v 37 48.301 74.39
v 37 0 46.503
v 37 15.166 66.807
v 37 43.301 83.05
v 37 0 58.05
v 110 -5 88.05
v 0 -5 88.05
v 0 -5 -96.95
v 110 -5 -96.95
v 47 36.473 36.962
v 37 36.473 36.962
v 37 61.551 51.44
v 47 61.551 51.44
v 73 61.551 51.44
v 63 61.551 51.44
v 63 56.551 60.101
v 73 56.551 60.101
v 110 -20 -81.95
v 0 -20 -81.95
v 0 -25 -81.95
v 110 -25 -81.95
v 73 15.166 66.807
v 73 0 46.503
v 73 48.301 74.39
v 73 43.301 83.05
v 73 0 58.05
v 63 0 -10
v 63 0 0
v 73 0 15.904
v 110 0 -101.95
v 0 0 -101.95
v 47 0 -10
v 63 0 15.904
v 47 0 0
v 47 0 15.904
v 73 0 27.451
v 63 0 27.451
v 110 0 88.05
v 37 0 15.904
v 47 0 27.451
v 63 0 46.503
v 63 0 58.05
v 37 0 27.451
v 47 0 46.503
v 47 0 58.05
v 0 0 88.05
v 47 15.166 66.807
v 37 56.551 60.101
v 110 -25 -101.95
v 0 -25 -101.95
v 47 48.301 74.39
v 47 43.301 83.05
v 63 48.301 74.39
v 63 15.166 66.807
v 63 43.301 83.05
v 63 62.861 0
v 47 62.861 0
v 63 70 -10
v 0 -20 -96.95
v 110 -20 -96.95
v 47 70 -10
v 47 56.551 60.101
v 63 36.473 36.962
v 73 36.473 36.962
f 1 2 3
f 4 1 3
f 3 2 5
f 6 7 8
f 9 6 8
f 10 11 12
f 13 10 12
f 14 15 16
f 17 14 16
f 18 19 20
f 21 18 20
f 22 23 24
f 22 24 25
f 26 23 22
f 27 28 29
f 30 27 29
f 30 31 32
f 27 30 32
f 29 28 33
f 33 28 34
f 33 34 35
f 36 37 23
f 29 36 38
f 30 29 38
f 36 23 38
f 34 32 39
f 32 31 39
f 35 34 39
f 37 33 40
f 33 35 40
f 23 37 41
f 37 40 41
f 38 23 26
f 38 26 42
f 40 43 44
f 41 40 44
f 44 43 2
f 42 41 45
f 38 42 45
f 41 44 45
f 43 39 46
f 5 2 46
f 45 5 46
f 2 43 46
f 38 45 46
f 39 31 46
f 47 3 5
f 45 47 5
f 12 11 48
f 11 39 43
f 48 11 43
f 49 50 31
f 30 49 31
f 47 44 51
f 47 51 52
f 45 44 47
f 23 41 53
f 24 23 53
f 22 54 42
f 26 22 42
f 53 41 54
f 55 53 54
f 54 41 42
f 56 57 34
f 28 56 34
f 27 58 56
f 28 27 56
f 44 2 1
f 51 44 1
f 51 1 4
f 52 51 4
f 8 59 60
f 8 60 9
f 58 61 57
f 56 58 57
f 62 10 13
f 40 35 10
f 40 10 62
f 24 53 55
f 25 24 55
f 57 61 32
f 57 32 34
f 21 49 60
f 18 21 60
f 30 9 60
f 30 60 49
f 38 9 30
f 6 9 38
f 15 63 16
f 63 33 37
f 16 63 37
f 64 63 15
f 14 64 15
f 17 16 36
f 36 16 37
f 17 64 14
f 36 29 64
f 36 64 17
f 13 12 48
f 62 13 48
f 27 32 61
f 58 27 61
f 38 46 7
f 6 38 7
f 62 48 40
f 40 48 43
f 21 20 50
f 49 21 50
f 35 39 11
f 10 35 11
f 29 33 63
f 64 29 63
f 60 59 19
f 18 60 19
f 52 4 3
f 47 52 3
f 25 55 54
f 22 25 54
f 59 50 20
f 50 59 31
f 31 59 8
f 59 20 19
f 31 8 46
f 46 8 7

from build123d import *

# Parameters (mm, degrees)
F0_W     = 15
F0_H     = 5
F1_DEPTH = 110
F2_W     = 8
F2_H     = 98.8297045976
F2_W_2   = 37
F2_H_2   = 91.1702954024
F2_W_3   = 10
F3_DEPTH = 100


# Not quite as in the source:
# - a feature of the source that left no trace in its solid (it failed there, or was rolled back) is left out


with BuildPart() as f1:
    # F0 (on Right) → F1 (new body)
    with BuildSketch(Plane.YZ):
        Polygon((30.635715595, 45.1382968587), (0, 27.4507582131), (0, 15.9037528294), (36.4732290688, 36.9615814504), align=None)
        Polygon((56.5512701892, 60.1006492799), (30.635715595, 45.1382968587), (36.4732290688, 36.9615814504), (61.5512701892, 51.4403952421), align=None)
        Polygon((15.1663048896, 66.8065926908), (0, 58.0503224802), (0, 46.5033170964), (21.0038183633, 58.6298772825), align=None)
        Polygon((43.3012701892, 83.0503224802), (15.1663048896, 66.8065926908), (21.0038183633, 58.6298772825), (48.3012701892, 74.3900684424), align=None)
        Polygon((-20, -101.9496775198), (-20, -96.9496775198), (-20, -81.9496775198), (-25, -81.9496775198), (-25, -101.9496775198), align=None)
        with Locations((-12.5, -99.4496775198)):
            Rectangle(F0_W, F0_H)
        Polygon((0, 88.0503224802), (-5, 88.0503224802), (-5, -96.9496775198), (-5, -101.9496775198), (0, -101.9496775198), (0, -10), (0, 0), (0, 15.9037528294), (0, 27.4507582131), (0, 46.5033170964), (0, 58.0503224802), align=None)
        Polygon((0, 0), (0, -10), (70, -10), (62.860808794, 0), align=None)
    extrude(amount=F1_DEPTH)

    # F2 (on Front) → F3 (cut)
    with BuildSketch(Plane.XZ):
        with Locations((51, 64.6969747171)):
            Rectangle(F2_W, F2_H)
        with Locations((59, 64.6969747171)):
            Rectangle(F2_W, F2_H)
        with Locations((91.5, -30.3030252829)):
            Rectangle(F2_W_2, F2_H_2)
        with Locations((18.5, -30.3030252829)):
            Rectangle(F2_W_2, F2_H_2)
        with Locations((42, -30.3030252829)):
            Rectangle(F2_W_3, F2_H_2)
        with Locations((68, -30.3030252829)):
            Rectangle(F2_W_3, F2_H_2)
        with Locations((91.5, 64.6969747171)):
            Rectangle(F2_W_2, F2_H)
        with Locations((18.5, 64.6969747171)):
            Rectangle(F2_W_2, F2_H)
    extrude(amount=-F3_DEPTH, mode=Mode.SUBTRACT)


solid = f1.part
